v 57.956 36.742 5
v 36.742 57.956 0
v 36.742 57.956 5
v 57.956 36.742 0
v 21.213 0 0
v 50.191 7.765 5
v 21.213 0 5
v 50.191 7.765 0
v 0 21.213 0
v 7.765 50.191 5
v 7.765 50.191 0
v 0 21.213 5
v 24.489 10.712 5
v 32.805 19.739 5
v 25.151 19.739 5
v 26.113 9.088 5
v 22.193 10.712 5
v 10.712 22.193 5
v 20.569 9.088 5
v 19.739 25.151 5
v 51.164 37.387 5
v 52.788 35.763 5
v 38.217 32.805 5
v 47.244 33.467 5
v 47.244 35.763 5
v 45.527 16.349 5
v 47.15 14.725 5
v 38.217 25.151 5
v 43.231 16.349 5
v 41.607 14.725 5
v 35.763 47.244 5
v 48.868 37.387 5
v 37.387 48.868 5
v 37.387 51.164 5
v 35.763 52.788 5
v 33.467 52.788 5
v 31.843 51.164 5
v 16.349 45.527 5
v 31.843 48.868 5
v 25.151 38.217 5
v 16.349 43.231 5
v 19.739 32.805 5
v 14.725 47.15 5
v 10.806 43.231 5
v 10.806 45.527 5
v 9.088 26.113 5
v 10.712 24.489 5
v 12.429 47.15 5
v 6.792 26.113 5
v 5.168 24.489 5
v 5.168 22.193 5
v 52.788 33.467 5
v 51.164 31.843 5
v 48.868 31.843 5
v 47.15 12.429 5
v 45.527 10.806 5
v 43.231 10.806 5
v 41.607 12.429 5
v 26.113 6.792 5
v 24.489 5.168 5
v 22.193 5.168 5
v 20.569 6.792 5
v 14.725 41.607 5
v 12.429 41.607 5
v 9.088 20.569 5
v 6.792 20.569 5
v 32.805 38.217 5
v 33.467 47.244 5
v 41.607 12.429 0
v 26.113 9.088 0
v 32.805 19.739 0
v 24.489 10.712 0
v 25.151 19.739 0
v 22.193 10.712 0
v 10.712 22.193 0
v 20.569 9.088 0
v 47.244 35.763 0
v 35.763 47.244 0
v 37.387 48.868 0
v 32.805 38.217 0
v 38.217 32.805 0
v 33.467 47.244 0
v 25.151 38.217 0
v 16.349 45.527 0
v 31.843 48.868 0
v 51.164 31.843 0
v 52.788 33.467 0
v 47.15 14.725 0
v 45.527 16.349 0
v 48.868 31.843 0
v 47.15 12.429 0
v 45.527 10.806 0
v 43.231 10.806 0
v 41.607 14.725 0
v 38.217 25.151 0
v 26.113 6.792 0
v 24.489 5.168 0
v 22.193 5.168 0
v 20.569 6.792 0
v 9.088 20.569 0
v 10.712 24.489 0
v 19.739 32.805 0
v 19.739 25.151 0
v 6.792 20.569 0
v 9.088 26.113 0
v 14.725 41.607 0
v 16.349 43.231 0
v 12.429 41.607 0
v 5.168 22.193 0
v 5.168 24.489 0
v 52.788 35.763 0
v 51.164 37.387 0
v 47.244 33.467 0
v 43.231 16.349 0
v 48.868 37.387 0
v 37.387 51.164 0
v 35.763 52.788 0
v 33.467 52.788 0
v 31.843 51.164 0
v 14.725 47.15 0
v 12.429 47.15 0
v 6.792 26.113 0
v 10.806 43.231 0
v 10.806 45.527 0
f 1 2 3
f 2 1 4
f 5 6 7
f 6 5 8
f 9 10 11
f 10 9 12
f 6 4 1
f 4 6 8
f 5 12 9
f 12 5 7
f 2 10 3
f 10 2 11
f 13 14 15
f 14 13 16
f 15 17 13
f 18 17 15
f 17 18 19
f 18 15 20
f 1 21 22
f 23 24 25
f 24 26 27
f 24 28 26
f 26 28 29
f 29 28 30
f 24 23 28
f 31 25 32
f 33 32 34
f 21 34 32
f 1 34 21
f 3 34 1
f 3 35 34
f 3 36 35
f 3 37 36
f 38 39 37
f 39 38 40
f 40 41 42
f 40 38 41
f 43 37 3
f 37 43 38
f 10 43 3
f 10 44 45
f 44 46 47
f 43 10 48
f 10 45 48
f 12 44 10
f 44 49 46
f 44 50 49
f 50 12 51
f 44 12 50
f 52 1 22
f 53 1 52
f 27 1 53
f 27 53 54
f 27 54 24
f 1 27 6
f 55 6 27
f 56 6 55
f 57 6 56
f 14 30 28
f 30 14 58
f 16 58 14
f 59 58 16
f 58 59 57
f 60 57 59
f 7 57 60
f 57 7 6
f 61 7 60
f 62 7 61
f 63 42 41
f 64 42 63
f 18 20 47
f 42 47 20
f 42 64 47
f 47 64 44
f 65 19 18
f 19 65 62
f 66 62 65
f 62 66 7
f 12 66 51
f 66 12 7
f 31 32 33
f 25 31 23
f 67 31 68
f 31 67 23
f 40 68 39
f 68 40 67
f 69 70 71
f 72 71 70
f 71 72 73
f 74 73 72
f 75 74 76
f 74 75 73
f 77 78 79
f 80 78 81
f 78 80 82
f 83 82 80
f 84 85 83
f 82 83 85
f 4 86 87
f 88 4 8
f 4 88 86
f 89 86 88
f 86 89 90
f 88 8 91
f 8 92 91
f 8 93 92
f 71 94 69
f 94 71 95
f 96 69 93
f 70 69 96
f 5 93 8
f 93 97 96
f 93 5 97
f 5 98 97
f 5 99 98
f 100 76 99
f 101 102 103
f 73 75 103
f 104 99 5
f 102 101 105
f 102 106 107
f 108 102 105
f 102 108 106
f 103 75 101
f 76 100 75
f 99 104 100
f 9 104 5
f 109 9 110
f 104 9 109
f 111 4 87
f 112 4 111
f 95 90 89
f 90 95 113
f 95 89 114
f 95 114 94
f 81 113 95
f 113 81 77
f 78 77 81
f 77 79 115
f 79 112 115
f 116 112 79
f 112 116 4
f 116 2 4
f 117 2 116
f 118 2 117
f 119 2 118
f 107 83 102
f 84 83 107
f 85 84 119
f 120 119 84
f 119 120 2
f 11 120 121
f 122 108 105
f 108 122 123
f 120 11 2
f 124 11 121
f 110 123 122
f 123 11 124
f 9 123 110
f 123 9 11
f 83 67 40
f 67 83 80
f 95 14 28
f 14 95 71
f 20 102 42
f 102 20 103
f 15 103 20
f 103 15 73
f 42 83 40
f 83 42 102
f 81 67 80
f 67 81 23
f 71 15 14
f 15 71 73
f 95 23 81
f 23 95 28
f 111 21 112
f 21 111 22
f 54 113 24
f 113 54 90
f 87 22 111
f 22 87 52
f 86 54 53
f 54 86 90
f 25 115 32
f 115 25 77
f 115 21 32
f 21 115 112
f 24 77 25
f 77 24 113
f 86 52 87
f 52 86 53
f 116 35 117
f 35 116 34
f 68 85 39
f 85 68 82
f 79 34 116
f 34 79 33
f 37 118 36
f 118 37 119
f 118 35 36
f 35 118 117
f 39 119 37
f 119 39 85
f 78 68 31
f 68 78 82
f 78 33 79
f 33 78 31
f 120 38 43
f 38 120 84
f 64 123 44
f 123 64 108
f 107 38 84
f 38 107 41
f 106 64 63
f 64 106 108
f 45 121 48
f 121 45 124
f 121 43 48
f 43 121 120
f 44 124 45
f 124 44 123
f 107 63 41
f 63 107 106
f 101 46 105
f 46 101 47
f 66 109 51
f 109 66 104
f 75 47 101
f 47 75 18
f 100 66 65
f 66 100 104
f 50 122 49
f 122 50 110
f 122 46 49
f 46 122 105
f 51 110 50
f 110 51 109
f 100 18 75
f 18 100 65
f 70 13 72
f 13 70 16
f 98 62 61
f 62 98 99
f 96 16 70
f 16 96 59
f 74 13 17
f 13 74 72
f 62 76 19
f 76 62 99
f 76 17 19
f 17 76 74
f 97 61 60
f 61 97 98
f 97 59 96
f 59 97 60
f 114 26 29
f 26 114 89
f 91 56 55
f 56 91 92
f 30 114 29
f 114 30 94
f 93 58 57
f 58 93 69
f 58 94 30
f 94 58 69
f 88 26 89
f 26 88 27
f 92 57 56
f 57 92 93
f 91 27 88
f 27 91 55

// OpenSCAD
$fn = 32;

// ----------------------------------------------------------------------
// Polygon plate: 6-gon R30, 6 bolt windows
// ----------------------------------------------------------------------

// --- parameters (mm) ---
sides = 6;                // number of polygon sides
plate_r = 30;             // circumscribed radius of the polygon
bore_r = 10;              // centre bore radius
bolts = 6;                // number of bolt windows
ring_r = 21.78;           // bolt-circle radius
bolt_r = 3;               // bolt window radius
plate_t = 5;              // plate thickness, Z (extrusion height)

plate_d = 2 * plate_r;  // circumscribed diameter
bore_d = 2 * bore_r;  // centre bore diameter
bolt_d = 2 * bolt_r;  // bolt window diameter
ring_d = 2 * ring_r;  // bolt-circle diameter

profile = [[57.956, 36.742], [36.742, 57.956], [7.765, 50.191], [0, 21.213], [21.213, 0], [50.191, 7.765]];  // primary outline, 6 points, counter clockwise
void_1 = [[38.217, 32.805], [32.805, 38.217], [25.151, 38.217], [19.739, 32.805], [19.739, 25.151], [25.151, 19.739], [32.805, 19.739], [38.217, 25.151]];  // centre bore, 8 points
void_2 = [[52.788, 35.763], [51.164, 37.387], [48.868, 37.387], [47.244, 35.763], [47.244, 33.467], [48.868, 31.843], [51.164, 31.843], [52.788, 33.467]];  // bolt window 1, 8 points
void_3 = [[37.387, 51.164], [35.763, 52.788], [33.467, 52.788], [31.843, 51.164], [31.843, 48.868], [33.467, 47.244], [35.763, 47.244], [37.387, 48.868]];  // bolt window 2, 8 points
void_4 = [[16.349, 45.527], [14.725, 47.15], [12.429, 47.15], [10.806, 45.527], [10.806, 43.231], [12.429, 41.607], [14.725, 41.607], [16.349, 43.231]];  // bolt window 3, 8 points
void_5 = [[10.712, 24.489], [9.088, 26.113], [6.792, 26.113], [5.168, 24.489], [5.168, 22.193], [6.792, 20.569], [9.088, 20.569], [10.712, 22.193]];  // bolt window 4, 8 points
void_6 = [[26.113, 9.088], [24.489, 10.712], [22.193, 10.712], [20.569, 9.088], [20.569, 6.792], [22.193, 5.168], [24.489, 5.168], [26.113, 6.792]];  // bolt window 5, 8 points
void_7 = [[47.15, 14.725], [45.527, 16.349], [43.231, 16.349], [41.607, 14.725], [41.607, 12.429], [43.231, 10.806], [45.527, 10.806], [47.15, 12.429]];  // bolt window 6, 8 points

// --- the one profile operation ---
difference() {
  linear_extrude(height = plate_t) polygon(points = profile);
  translate([0, 0, -1])
    linear_extrude(height = plate_t + 2) polygon(points = void_1);
  translate([0, 0, -1])
    linear_extrude(height = plate_t + 2) polygon(points = void_2);
  translate([0, 0, -1])
    linear_extrude(height = plate_t + 2) polygon(points = void_3);
  translate([0, 0, -1])
    linear_extrude(height = plate_t + 2) polygon(points = void_4);
  translate([0, 0, -1])
    linear_extrude(height = plate_t + 2) polygon(points = void_5);
  translate([0, 0, -1])
    linear_extrude(height = plate_t + 2) polygon(points = void_6);
  translate([0, 0, -1])
    linear_extrude(height = plate_t + 2) polygon(points = void_7);
}
